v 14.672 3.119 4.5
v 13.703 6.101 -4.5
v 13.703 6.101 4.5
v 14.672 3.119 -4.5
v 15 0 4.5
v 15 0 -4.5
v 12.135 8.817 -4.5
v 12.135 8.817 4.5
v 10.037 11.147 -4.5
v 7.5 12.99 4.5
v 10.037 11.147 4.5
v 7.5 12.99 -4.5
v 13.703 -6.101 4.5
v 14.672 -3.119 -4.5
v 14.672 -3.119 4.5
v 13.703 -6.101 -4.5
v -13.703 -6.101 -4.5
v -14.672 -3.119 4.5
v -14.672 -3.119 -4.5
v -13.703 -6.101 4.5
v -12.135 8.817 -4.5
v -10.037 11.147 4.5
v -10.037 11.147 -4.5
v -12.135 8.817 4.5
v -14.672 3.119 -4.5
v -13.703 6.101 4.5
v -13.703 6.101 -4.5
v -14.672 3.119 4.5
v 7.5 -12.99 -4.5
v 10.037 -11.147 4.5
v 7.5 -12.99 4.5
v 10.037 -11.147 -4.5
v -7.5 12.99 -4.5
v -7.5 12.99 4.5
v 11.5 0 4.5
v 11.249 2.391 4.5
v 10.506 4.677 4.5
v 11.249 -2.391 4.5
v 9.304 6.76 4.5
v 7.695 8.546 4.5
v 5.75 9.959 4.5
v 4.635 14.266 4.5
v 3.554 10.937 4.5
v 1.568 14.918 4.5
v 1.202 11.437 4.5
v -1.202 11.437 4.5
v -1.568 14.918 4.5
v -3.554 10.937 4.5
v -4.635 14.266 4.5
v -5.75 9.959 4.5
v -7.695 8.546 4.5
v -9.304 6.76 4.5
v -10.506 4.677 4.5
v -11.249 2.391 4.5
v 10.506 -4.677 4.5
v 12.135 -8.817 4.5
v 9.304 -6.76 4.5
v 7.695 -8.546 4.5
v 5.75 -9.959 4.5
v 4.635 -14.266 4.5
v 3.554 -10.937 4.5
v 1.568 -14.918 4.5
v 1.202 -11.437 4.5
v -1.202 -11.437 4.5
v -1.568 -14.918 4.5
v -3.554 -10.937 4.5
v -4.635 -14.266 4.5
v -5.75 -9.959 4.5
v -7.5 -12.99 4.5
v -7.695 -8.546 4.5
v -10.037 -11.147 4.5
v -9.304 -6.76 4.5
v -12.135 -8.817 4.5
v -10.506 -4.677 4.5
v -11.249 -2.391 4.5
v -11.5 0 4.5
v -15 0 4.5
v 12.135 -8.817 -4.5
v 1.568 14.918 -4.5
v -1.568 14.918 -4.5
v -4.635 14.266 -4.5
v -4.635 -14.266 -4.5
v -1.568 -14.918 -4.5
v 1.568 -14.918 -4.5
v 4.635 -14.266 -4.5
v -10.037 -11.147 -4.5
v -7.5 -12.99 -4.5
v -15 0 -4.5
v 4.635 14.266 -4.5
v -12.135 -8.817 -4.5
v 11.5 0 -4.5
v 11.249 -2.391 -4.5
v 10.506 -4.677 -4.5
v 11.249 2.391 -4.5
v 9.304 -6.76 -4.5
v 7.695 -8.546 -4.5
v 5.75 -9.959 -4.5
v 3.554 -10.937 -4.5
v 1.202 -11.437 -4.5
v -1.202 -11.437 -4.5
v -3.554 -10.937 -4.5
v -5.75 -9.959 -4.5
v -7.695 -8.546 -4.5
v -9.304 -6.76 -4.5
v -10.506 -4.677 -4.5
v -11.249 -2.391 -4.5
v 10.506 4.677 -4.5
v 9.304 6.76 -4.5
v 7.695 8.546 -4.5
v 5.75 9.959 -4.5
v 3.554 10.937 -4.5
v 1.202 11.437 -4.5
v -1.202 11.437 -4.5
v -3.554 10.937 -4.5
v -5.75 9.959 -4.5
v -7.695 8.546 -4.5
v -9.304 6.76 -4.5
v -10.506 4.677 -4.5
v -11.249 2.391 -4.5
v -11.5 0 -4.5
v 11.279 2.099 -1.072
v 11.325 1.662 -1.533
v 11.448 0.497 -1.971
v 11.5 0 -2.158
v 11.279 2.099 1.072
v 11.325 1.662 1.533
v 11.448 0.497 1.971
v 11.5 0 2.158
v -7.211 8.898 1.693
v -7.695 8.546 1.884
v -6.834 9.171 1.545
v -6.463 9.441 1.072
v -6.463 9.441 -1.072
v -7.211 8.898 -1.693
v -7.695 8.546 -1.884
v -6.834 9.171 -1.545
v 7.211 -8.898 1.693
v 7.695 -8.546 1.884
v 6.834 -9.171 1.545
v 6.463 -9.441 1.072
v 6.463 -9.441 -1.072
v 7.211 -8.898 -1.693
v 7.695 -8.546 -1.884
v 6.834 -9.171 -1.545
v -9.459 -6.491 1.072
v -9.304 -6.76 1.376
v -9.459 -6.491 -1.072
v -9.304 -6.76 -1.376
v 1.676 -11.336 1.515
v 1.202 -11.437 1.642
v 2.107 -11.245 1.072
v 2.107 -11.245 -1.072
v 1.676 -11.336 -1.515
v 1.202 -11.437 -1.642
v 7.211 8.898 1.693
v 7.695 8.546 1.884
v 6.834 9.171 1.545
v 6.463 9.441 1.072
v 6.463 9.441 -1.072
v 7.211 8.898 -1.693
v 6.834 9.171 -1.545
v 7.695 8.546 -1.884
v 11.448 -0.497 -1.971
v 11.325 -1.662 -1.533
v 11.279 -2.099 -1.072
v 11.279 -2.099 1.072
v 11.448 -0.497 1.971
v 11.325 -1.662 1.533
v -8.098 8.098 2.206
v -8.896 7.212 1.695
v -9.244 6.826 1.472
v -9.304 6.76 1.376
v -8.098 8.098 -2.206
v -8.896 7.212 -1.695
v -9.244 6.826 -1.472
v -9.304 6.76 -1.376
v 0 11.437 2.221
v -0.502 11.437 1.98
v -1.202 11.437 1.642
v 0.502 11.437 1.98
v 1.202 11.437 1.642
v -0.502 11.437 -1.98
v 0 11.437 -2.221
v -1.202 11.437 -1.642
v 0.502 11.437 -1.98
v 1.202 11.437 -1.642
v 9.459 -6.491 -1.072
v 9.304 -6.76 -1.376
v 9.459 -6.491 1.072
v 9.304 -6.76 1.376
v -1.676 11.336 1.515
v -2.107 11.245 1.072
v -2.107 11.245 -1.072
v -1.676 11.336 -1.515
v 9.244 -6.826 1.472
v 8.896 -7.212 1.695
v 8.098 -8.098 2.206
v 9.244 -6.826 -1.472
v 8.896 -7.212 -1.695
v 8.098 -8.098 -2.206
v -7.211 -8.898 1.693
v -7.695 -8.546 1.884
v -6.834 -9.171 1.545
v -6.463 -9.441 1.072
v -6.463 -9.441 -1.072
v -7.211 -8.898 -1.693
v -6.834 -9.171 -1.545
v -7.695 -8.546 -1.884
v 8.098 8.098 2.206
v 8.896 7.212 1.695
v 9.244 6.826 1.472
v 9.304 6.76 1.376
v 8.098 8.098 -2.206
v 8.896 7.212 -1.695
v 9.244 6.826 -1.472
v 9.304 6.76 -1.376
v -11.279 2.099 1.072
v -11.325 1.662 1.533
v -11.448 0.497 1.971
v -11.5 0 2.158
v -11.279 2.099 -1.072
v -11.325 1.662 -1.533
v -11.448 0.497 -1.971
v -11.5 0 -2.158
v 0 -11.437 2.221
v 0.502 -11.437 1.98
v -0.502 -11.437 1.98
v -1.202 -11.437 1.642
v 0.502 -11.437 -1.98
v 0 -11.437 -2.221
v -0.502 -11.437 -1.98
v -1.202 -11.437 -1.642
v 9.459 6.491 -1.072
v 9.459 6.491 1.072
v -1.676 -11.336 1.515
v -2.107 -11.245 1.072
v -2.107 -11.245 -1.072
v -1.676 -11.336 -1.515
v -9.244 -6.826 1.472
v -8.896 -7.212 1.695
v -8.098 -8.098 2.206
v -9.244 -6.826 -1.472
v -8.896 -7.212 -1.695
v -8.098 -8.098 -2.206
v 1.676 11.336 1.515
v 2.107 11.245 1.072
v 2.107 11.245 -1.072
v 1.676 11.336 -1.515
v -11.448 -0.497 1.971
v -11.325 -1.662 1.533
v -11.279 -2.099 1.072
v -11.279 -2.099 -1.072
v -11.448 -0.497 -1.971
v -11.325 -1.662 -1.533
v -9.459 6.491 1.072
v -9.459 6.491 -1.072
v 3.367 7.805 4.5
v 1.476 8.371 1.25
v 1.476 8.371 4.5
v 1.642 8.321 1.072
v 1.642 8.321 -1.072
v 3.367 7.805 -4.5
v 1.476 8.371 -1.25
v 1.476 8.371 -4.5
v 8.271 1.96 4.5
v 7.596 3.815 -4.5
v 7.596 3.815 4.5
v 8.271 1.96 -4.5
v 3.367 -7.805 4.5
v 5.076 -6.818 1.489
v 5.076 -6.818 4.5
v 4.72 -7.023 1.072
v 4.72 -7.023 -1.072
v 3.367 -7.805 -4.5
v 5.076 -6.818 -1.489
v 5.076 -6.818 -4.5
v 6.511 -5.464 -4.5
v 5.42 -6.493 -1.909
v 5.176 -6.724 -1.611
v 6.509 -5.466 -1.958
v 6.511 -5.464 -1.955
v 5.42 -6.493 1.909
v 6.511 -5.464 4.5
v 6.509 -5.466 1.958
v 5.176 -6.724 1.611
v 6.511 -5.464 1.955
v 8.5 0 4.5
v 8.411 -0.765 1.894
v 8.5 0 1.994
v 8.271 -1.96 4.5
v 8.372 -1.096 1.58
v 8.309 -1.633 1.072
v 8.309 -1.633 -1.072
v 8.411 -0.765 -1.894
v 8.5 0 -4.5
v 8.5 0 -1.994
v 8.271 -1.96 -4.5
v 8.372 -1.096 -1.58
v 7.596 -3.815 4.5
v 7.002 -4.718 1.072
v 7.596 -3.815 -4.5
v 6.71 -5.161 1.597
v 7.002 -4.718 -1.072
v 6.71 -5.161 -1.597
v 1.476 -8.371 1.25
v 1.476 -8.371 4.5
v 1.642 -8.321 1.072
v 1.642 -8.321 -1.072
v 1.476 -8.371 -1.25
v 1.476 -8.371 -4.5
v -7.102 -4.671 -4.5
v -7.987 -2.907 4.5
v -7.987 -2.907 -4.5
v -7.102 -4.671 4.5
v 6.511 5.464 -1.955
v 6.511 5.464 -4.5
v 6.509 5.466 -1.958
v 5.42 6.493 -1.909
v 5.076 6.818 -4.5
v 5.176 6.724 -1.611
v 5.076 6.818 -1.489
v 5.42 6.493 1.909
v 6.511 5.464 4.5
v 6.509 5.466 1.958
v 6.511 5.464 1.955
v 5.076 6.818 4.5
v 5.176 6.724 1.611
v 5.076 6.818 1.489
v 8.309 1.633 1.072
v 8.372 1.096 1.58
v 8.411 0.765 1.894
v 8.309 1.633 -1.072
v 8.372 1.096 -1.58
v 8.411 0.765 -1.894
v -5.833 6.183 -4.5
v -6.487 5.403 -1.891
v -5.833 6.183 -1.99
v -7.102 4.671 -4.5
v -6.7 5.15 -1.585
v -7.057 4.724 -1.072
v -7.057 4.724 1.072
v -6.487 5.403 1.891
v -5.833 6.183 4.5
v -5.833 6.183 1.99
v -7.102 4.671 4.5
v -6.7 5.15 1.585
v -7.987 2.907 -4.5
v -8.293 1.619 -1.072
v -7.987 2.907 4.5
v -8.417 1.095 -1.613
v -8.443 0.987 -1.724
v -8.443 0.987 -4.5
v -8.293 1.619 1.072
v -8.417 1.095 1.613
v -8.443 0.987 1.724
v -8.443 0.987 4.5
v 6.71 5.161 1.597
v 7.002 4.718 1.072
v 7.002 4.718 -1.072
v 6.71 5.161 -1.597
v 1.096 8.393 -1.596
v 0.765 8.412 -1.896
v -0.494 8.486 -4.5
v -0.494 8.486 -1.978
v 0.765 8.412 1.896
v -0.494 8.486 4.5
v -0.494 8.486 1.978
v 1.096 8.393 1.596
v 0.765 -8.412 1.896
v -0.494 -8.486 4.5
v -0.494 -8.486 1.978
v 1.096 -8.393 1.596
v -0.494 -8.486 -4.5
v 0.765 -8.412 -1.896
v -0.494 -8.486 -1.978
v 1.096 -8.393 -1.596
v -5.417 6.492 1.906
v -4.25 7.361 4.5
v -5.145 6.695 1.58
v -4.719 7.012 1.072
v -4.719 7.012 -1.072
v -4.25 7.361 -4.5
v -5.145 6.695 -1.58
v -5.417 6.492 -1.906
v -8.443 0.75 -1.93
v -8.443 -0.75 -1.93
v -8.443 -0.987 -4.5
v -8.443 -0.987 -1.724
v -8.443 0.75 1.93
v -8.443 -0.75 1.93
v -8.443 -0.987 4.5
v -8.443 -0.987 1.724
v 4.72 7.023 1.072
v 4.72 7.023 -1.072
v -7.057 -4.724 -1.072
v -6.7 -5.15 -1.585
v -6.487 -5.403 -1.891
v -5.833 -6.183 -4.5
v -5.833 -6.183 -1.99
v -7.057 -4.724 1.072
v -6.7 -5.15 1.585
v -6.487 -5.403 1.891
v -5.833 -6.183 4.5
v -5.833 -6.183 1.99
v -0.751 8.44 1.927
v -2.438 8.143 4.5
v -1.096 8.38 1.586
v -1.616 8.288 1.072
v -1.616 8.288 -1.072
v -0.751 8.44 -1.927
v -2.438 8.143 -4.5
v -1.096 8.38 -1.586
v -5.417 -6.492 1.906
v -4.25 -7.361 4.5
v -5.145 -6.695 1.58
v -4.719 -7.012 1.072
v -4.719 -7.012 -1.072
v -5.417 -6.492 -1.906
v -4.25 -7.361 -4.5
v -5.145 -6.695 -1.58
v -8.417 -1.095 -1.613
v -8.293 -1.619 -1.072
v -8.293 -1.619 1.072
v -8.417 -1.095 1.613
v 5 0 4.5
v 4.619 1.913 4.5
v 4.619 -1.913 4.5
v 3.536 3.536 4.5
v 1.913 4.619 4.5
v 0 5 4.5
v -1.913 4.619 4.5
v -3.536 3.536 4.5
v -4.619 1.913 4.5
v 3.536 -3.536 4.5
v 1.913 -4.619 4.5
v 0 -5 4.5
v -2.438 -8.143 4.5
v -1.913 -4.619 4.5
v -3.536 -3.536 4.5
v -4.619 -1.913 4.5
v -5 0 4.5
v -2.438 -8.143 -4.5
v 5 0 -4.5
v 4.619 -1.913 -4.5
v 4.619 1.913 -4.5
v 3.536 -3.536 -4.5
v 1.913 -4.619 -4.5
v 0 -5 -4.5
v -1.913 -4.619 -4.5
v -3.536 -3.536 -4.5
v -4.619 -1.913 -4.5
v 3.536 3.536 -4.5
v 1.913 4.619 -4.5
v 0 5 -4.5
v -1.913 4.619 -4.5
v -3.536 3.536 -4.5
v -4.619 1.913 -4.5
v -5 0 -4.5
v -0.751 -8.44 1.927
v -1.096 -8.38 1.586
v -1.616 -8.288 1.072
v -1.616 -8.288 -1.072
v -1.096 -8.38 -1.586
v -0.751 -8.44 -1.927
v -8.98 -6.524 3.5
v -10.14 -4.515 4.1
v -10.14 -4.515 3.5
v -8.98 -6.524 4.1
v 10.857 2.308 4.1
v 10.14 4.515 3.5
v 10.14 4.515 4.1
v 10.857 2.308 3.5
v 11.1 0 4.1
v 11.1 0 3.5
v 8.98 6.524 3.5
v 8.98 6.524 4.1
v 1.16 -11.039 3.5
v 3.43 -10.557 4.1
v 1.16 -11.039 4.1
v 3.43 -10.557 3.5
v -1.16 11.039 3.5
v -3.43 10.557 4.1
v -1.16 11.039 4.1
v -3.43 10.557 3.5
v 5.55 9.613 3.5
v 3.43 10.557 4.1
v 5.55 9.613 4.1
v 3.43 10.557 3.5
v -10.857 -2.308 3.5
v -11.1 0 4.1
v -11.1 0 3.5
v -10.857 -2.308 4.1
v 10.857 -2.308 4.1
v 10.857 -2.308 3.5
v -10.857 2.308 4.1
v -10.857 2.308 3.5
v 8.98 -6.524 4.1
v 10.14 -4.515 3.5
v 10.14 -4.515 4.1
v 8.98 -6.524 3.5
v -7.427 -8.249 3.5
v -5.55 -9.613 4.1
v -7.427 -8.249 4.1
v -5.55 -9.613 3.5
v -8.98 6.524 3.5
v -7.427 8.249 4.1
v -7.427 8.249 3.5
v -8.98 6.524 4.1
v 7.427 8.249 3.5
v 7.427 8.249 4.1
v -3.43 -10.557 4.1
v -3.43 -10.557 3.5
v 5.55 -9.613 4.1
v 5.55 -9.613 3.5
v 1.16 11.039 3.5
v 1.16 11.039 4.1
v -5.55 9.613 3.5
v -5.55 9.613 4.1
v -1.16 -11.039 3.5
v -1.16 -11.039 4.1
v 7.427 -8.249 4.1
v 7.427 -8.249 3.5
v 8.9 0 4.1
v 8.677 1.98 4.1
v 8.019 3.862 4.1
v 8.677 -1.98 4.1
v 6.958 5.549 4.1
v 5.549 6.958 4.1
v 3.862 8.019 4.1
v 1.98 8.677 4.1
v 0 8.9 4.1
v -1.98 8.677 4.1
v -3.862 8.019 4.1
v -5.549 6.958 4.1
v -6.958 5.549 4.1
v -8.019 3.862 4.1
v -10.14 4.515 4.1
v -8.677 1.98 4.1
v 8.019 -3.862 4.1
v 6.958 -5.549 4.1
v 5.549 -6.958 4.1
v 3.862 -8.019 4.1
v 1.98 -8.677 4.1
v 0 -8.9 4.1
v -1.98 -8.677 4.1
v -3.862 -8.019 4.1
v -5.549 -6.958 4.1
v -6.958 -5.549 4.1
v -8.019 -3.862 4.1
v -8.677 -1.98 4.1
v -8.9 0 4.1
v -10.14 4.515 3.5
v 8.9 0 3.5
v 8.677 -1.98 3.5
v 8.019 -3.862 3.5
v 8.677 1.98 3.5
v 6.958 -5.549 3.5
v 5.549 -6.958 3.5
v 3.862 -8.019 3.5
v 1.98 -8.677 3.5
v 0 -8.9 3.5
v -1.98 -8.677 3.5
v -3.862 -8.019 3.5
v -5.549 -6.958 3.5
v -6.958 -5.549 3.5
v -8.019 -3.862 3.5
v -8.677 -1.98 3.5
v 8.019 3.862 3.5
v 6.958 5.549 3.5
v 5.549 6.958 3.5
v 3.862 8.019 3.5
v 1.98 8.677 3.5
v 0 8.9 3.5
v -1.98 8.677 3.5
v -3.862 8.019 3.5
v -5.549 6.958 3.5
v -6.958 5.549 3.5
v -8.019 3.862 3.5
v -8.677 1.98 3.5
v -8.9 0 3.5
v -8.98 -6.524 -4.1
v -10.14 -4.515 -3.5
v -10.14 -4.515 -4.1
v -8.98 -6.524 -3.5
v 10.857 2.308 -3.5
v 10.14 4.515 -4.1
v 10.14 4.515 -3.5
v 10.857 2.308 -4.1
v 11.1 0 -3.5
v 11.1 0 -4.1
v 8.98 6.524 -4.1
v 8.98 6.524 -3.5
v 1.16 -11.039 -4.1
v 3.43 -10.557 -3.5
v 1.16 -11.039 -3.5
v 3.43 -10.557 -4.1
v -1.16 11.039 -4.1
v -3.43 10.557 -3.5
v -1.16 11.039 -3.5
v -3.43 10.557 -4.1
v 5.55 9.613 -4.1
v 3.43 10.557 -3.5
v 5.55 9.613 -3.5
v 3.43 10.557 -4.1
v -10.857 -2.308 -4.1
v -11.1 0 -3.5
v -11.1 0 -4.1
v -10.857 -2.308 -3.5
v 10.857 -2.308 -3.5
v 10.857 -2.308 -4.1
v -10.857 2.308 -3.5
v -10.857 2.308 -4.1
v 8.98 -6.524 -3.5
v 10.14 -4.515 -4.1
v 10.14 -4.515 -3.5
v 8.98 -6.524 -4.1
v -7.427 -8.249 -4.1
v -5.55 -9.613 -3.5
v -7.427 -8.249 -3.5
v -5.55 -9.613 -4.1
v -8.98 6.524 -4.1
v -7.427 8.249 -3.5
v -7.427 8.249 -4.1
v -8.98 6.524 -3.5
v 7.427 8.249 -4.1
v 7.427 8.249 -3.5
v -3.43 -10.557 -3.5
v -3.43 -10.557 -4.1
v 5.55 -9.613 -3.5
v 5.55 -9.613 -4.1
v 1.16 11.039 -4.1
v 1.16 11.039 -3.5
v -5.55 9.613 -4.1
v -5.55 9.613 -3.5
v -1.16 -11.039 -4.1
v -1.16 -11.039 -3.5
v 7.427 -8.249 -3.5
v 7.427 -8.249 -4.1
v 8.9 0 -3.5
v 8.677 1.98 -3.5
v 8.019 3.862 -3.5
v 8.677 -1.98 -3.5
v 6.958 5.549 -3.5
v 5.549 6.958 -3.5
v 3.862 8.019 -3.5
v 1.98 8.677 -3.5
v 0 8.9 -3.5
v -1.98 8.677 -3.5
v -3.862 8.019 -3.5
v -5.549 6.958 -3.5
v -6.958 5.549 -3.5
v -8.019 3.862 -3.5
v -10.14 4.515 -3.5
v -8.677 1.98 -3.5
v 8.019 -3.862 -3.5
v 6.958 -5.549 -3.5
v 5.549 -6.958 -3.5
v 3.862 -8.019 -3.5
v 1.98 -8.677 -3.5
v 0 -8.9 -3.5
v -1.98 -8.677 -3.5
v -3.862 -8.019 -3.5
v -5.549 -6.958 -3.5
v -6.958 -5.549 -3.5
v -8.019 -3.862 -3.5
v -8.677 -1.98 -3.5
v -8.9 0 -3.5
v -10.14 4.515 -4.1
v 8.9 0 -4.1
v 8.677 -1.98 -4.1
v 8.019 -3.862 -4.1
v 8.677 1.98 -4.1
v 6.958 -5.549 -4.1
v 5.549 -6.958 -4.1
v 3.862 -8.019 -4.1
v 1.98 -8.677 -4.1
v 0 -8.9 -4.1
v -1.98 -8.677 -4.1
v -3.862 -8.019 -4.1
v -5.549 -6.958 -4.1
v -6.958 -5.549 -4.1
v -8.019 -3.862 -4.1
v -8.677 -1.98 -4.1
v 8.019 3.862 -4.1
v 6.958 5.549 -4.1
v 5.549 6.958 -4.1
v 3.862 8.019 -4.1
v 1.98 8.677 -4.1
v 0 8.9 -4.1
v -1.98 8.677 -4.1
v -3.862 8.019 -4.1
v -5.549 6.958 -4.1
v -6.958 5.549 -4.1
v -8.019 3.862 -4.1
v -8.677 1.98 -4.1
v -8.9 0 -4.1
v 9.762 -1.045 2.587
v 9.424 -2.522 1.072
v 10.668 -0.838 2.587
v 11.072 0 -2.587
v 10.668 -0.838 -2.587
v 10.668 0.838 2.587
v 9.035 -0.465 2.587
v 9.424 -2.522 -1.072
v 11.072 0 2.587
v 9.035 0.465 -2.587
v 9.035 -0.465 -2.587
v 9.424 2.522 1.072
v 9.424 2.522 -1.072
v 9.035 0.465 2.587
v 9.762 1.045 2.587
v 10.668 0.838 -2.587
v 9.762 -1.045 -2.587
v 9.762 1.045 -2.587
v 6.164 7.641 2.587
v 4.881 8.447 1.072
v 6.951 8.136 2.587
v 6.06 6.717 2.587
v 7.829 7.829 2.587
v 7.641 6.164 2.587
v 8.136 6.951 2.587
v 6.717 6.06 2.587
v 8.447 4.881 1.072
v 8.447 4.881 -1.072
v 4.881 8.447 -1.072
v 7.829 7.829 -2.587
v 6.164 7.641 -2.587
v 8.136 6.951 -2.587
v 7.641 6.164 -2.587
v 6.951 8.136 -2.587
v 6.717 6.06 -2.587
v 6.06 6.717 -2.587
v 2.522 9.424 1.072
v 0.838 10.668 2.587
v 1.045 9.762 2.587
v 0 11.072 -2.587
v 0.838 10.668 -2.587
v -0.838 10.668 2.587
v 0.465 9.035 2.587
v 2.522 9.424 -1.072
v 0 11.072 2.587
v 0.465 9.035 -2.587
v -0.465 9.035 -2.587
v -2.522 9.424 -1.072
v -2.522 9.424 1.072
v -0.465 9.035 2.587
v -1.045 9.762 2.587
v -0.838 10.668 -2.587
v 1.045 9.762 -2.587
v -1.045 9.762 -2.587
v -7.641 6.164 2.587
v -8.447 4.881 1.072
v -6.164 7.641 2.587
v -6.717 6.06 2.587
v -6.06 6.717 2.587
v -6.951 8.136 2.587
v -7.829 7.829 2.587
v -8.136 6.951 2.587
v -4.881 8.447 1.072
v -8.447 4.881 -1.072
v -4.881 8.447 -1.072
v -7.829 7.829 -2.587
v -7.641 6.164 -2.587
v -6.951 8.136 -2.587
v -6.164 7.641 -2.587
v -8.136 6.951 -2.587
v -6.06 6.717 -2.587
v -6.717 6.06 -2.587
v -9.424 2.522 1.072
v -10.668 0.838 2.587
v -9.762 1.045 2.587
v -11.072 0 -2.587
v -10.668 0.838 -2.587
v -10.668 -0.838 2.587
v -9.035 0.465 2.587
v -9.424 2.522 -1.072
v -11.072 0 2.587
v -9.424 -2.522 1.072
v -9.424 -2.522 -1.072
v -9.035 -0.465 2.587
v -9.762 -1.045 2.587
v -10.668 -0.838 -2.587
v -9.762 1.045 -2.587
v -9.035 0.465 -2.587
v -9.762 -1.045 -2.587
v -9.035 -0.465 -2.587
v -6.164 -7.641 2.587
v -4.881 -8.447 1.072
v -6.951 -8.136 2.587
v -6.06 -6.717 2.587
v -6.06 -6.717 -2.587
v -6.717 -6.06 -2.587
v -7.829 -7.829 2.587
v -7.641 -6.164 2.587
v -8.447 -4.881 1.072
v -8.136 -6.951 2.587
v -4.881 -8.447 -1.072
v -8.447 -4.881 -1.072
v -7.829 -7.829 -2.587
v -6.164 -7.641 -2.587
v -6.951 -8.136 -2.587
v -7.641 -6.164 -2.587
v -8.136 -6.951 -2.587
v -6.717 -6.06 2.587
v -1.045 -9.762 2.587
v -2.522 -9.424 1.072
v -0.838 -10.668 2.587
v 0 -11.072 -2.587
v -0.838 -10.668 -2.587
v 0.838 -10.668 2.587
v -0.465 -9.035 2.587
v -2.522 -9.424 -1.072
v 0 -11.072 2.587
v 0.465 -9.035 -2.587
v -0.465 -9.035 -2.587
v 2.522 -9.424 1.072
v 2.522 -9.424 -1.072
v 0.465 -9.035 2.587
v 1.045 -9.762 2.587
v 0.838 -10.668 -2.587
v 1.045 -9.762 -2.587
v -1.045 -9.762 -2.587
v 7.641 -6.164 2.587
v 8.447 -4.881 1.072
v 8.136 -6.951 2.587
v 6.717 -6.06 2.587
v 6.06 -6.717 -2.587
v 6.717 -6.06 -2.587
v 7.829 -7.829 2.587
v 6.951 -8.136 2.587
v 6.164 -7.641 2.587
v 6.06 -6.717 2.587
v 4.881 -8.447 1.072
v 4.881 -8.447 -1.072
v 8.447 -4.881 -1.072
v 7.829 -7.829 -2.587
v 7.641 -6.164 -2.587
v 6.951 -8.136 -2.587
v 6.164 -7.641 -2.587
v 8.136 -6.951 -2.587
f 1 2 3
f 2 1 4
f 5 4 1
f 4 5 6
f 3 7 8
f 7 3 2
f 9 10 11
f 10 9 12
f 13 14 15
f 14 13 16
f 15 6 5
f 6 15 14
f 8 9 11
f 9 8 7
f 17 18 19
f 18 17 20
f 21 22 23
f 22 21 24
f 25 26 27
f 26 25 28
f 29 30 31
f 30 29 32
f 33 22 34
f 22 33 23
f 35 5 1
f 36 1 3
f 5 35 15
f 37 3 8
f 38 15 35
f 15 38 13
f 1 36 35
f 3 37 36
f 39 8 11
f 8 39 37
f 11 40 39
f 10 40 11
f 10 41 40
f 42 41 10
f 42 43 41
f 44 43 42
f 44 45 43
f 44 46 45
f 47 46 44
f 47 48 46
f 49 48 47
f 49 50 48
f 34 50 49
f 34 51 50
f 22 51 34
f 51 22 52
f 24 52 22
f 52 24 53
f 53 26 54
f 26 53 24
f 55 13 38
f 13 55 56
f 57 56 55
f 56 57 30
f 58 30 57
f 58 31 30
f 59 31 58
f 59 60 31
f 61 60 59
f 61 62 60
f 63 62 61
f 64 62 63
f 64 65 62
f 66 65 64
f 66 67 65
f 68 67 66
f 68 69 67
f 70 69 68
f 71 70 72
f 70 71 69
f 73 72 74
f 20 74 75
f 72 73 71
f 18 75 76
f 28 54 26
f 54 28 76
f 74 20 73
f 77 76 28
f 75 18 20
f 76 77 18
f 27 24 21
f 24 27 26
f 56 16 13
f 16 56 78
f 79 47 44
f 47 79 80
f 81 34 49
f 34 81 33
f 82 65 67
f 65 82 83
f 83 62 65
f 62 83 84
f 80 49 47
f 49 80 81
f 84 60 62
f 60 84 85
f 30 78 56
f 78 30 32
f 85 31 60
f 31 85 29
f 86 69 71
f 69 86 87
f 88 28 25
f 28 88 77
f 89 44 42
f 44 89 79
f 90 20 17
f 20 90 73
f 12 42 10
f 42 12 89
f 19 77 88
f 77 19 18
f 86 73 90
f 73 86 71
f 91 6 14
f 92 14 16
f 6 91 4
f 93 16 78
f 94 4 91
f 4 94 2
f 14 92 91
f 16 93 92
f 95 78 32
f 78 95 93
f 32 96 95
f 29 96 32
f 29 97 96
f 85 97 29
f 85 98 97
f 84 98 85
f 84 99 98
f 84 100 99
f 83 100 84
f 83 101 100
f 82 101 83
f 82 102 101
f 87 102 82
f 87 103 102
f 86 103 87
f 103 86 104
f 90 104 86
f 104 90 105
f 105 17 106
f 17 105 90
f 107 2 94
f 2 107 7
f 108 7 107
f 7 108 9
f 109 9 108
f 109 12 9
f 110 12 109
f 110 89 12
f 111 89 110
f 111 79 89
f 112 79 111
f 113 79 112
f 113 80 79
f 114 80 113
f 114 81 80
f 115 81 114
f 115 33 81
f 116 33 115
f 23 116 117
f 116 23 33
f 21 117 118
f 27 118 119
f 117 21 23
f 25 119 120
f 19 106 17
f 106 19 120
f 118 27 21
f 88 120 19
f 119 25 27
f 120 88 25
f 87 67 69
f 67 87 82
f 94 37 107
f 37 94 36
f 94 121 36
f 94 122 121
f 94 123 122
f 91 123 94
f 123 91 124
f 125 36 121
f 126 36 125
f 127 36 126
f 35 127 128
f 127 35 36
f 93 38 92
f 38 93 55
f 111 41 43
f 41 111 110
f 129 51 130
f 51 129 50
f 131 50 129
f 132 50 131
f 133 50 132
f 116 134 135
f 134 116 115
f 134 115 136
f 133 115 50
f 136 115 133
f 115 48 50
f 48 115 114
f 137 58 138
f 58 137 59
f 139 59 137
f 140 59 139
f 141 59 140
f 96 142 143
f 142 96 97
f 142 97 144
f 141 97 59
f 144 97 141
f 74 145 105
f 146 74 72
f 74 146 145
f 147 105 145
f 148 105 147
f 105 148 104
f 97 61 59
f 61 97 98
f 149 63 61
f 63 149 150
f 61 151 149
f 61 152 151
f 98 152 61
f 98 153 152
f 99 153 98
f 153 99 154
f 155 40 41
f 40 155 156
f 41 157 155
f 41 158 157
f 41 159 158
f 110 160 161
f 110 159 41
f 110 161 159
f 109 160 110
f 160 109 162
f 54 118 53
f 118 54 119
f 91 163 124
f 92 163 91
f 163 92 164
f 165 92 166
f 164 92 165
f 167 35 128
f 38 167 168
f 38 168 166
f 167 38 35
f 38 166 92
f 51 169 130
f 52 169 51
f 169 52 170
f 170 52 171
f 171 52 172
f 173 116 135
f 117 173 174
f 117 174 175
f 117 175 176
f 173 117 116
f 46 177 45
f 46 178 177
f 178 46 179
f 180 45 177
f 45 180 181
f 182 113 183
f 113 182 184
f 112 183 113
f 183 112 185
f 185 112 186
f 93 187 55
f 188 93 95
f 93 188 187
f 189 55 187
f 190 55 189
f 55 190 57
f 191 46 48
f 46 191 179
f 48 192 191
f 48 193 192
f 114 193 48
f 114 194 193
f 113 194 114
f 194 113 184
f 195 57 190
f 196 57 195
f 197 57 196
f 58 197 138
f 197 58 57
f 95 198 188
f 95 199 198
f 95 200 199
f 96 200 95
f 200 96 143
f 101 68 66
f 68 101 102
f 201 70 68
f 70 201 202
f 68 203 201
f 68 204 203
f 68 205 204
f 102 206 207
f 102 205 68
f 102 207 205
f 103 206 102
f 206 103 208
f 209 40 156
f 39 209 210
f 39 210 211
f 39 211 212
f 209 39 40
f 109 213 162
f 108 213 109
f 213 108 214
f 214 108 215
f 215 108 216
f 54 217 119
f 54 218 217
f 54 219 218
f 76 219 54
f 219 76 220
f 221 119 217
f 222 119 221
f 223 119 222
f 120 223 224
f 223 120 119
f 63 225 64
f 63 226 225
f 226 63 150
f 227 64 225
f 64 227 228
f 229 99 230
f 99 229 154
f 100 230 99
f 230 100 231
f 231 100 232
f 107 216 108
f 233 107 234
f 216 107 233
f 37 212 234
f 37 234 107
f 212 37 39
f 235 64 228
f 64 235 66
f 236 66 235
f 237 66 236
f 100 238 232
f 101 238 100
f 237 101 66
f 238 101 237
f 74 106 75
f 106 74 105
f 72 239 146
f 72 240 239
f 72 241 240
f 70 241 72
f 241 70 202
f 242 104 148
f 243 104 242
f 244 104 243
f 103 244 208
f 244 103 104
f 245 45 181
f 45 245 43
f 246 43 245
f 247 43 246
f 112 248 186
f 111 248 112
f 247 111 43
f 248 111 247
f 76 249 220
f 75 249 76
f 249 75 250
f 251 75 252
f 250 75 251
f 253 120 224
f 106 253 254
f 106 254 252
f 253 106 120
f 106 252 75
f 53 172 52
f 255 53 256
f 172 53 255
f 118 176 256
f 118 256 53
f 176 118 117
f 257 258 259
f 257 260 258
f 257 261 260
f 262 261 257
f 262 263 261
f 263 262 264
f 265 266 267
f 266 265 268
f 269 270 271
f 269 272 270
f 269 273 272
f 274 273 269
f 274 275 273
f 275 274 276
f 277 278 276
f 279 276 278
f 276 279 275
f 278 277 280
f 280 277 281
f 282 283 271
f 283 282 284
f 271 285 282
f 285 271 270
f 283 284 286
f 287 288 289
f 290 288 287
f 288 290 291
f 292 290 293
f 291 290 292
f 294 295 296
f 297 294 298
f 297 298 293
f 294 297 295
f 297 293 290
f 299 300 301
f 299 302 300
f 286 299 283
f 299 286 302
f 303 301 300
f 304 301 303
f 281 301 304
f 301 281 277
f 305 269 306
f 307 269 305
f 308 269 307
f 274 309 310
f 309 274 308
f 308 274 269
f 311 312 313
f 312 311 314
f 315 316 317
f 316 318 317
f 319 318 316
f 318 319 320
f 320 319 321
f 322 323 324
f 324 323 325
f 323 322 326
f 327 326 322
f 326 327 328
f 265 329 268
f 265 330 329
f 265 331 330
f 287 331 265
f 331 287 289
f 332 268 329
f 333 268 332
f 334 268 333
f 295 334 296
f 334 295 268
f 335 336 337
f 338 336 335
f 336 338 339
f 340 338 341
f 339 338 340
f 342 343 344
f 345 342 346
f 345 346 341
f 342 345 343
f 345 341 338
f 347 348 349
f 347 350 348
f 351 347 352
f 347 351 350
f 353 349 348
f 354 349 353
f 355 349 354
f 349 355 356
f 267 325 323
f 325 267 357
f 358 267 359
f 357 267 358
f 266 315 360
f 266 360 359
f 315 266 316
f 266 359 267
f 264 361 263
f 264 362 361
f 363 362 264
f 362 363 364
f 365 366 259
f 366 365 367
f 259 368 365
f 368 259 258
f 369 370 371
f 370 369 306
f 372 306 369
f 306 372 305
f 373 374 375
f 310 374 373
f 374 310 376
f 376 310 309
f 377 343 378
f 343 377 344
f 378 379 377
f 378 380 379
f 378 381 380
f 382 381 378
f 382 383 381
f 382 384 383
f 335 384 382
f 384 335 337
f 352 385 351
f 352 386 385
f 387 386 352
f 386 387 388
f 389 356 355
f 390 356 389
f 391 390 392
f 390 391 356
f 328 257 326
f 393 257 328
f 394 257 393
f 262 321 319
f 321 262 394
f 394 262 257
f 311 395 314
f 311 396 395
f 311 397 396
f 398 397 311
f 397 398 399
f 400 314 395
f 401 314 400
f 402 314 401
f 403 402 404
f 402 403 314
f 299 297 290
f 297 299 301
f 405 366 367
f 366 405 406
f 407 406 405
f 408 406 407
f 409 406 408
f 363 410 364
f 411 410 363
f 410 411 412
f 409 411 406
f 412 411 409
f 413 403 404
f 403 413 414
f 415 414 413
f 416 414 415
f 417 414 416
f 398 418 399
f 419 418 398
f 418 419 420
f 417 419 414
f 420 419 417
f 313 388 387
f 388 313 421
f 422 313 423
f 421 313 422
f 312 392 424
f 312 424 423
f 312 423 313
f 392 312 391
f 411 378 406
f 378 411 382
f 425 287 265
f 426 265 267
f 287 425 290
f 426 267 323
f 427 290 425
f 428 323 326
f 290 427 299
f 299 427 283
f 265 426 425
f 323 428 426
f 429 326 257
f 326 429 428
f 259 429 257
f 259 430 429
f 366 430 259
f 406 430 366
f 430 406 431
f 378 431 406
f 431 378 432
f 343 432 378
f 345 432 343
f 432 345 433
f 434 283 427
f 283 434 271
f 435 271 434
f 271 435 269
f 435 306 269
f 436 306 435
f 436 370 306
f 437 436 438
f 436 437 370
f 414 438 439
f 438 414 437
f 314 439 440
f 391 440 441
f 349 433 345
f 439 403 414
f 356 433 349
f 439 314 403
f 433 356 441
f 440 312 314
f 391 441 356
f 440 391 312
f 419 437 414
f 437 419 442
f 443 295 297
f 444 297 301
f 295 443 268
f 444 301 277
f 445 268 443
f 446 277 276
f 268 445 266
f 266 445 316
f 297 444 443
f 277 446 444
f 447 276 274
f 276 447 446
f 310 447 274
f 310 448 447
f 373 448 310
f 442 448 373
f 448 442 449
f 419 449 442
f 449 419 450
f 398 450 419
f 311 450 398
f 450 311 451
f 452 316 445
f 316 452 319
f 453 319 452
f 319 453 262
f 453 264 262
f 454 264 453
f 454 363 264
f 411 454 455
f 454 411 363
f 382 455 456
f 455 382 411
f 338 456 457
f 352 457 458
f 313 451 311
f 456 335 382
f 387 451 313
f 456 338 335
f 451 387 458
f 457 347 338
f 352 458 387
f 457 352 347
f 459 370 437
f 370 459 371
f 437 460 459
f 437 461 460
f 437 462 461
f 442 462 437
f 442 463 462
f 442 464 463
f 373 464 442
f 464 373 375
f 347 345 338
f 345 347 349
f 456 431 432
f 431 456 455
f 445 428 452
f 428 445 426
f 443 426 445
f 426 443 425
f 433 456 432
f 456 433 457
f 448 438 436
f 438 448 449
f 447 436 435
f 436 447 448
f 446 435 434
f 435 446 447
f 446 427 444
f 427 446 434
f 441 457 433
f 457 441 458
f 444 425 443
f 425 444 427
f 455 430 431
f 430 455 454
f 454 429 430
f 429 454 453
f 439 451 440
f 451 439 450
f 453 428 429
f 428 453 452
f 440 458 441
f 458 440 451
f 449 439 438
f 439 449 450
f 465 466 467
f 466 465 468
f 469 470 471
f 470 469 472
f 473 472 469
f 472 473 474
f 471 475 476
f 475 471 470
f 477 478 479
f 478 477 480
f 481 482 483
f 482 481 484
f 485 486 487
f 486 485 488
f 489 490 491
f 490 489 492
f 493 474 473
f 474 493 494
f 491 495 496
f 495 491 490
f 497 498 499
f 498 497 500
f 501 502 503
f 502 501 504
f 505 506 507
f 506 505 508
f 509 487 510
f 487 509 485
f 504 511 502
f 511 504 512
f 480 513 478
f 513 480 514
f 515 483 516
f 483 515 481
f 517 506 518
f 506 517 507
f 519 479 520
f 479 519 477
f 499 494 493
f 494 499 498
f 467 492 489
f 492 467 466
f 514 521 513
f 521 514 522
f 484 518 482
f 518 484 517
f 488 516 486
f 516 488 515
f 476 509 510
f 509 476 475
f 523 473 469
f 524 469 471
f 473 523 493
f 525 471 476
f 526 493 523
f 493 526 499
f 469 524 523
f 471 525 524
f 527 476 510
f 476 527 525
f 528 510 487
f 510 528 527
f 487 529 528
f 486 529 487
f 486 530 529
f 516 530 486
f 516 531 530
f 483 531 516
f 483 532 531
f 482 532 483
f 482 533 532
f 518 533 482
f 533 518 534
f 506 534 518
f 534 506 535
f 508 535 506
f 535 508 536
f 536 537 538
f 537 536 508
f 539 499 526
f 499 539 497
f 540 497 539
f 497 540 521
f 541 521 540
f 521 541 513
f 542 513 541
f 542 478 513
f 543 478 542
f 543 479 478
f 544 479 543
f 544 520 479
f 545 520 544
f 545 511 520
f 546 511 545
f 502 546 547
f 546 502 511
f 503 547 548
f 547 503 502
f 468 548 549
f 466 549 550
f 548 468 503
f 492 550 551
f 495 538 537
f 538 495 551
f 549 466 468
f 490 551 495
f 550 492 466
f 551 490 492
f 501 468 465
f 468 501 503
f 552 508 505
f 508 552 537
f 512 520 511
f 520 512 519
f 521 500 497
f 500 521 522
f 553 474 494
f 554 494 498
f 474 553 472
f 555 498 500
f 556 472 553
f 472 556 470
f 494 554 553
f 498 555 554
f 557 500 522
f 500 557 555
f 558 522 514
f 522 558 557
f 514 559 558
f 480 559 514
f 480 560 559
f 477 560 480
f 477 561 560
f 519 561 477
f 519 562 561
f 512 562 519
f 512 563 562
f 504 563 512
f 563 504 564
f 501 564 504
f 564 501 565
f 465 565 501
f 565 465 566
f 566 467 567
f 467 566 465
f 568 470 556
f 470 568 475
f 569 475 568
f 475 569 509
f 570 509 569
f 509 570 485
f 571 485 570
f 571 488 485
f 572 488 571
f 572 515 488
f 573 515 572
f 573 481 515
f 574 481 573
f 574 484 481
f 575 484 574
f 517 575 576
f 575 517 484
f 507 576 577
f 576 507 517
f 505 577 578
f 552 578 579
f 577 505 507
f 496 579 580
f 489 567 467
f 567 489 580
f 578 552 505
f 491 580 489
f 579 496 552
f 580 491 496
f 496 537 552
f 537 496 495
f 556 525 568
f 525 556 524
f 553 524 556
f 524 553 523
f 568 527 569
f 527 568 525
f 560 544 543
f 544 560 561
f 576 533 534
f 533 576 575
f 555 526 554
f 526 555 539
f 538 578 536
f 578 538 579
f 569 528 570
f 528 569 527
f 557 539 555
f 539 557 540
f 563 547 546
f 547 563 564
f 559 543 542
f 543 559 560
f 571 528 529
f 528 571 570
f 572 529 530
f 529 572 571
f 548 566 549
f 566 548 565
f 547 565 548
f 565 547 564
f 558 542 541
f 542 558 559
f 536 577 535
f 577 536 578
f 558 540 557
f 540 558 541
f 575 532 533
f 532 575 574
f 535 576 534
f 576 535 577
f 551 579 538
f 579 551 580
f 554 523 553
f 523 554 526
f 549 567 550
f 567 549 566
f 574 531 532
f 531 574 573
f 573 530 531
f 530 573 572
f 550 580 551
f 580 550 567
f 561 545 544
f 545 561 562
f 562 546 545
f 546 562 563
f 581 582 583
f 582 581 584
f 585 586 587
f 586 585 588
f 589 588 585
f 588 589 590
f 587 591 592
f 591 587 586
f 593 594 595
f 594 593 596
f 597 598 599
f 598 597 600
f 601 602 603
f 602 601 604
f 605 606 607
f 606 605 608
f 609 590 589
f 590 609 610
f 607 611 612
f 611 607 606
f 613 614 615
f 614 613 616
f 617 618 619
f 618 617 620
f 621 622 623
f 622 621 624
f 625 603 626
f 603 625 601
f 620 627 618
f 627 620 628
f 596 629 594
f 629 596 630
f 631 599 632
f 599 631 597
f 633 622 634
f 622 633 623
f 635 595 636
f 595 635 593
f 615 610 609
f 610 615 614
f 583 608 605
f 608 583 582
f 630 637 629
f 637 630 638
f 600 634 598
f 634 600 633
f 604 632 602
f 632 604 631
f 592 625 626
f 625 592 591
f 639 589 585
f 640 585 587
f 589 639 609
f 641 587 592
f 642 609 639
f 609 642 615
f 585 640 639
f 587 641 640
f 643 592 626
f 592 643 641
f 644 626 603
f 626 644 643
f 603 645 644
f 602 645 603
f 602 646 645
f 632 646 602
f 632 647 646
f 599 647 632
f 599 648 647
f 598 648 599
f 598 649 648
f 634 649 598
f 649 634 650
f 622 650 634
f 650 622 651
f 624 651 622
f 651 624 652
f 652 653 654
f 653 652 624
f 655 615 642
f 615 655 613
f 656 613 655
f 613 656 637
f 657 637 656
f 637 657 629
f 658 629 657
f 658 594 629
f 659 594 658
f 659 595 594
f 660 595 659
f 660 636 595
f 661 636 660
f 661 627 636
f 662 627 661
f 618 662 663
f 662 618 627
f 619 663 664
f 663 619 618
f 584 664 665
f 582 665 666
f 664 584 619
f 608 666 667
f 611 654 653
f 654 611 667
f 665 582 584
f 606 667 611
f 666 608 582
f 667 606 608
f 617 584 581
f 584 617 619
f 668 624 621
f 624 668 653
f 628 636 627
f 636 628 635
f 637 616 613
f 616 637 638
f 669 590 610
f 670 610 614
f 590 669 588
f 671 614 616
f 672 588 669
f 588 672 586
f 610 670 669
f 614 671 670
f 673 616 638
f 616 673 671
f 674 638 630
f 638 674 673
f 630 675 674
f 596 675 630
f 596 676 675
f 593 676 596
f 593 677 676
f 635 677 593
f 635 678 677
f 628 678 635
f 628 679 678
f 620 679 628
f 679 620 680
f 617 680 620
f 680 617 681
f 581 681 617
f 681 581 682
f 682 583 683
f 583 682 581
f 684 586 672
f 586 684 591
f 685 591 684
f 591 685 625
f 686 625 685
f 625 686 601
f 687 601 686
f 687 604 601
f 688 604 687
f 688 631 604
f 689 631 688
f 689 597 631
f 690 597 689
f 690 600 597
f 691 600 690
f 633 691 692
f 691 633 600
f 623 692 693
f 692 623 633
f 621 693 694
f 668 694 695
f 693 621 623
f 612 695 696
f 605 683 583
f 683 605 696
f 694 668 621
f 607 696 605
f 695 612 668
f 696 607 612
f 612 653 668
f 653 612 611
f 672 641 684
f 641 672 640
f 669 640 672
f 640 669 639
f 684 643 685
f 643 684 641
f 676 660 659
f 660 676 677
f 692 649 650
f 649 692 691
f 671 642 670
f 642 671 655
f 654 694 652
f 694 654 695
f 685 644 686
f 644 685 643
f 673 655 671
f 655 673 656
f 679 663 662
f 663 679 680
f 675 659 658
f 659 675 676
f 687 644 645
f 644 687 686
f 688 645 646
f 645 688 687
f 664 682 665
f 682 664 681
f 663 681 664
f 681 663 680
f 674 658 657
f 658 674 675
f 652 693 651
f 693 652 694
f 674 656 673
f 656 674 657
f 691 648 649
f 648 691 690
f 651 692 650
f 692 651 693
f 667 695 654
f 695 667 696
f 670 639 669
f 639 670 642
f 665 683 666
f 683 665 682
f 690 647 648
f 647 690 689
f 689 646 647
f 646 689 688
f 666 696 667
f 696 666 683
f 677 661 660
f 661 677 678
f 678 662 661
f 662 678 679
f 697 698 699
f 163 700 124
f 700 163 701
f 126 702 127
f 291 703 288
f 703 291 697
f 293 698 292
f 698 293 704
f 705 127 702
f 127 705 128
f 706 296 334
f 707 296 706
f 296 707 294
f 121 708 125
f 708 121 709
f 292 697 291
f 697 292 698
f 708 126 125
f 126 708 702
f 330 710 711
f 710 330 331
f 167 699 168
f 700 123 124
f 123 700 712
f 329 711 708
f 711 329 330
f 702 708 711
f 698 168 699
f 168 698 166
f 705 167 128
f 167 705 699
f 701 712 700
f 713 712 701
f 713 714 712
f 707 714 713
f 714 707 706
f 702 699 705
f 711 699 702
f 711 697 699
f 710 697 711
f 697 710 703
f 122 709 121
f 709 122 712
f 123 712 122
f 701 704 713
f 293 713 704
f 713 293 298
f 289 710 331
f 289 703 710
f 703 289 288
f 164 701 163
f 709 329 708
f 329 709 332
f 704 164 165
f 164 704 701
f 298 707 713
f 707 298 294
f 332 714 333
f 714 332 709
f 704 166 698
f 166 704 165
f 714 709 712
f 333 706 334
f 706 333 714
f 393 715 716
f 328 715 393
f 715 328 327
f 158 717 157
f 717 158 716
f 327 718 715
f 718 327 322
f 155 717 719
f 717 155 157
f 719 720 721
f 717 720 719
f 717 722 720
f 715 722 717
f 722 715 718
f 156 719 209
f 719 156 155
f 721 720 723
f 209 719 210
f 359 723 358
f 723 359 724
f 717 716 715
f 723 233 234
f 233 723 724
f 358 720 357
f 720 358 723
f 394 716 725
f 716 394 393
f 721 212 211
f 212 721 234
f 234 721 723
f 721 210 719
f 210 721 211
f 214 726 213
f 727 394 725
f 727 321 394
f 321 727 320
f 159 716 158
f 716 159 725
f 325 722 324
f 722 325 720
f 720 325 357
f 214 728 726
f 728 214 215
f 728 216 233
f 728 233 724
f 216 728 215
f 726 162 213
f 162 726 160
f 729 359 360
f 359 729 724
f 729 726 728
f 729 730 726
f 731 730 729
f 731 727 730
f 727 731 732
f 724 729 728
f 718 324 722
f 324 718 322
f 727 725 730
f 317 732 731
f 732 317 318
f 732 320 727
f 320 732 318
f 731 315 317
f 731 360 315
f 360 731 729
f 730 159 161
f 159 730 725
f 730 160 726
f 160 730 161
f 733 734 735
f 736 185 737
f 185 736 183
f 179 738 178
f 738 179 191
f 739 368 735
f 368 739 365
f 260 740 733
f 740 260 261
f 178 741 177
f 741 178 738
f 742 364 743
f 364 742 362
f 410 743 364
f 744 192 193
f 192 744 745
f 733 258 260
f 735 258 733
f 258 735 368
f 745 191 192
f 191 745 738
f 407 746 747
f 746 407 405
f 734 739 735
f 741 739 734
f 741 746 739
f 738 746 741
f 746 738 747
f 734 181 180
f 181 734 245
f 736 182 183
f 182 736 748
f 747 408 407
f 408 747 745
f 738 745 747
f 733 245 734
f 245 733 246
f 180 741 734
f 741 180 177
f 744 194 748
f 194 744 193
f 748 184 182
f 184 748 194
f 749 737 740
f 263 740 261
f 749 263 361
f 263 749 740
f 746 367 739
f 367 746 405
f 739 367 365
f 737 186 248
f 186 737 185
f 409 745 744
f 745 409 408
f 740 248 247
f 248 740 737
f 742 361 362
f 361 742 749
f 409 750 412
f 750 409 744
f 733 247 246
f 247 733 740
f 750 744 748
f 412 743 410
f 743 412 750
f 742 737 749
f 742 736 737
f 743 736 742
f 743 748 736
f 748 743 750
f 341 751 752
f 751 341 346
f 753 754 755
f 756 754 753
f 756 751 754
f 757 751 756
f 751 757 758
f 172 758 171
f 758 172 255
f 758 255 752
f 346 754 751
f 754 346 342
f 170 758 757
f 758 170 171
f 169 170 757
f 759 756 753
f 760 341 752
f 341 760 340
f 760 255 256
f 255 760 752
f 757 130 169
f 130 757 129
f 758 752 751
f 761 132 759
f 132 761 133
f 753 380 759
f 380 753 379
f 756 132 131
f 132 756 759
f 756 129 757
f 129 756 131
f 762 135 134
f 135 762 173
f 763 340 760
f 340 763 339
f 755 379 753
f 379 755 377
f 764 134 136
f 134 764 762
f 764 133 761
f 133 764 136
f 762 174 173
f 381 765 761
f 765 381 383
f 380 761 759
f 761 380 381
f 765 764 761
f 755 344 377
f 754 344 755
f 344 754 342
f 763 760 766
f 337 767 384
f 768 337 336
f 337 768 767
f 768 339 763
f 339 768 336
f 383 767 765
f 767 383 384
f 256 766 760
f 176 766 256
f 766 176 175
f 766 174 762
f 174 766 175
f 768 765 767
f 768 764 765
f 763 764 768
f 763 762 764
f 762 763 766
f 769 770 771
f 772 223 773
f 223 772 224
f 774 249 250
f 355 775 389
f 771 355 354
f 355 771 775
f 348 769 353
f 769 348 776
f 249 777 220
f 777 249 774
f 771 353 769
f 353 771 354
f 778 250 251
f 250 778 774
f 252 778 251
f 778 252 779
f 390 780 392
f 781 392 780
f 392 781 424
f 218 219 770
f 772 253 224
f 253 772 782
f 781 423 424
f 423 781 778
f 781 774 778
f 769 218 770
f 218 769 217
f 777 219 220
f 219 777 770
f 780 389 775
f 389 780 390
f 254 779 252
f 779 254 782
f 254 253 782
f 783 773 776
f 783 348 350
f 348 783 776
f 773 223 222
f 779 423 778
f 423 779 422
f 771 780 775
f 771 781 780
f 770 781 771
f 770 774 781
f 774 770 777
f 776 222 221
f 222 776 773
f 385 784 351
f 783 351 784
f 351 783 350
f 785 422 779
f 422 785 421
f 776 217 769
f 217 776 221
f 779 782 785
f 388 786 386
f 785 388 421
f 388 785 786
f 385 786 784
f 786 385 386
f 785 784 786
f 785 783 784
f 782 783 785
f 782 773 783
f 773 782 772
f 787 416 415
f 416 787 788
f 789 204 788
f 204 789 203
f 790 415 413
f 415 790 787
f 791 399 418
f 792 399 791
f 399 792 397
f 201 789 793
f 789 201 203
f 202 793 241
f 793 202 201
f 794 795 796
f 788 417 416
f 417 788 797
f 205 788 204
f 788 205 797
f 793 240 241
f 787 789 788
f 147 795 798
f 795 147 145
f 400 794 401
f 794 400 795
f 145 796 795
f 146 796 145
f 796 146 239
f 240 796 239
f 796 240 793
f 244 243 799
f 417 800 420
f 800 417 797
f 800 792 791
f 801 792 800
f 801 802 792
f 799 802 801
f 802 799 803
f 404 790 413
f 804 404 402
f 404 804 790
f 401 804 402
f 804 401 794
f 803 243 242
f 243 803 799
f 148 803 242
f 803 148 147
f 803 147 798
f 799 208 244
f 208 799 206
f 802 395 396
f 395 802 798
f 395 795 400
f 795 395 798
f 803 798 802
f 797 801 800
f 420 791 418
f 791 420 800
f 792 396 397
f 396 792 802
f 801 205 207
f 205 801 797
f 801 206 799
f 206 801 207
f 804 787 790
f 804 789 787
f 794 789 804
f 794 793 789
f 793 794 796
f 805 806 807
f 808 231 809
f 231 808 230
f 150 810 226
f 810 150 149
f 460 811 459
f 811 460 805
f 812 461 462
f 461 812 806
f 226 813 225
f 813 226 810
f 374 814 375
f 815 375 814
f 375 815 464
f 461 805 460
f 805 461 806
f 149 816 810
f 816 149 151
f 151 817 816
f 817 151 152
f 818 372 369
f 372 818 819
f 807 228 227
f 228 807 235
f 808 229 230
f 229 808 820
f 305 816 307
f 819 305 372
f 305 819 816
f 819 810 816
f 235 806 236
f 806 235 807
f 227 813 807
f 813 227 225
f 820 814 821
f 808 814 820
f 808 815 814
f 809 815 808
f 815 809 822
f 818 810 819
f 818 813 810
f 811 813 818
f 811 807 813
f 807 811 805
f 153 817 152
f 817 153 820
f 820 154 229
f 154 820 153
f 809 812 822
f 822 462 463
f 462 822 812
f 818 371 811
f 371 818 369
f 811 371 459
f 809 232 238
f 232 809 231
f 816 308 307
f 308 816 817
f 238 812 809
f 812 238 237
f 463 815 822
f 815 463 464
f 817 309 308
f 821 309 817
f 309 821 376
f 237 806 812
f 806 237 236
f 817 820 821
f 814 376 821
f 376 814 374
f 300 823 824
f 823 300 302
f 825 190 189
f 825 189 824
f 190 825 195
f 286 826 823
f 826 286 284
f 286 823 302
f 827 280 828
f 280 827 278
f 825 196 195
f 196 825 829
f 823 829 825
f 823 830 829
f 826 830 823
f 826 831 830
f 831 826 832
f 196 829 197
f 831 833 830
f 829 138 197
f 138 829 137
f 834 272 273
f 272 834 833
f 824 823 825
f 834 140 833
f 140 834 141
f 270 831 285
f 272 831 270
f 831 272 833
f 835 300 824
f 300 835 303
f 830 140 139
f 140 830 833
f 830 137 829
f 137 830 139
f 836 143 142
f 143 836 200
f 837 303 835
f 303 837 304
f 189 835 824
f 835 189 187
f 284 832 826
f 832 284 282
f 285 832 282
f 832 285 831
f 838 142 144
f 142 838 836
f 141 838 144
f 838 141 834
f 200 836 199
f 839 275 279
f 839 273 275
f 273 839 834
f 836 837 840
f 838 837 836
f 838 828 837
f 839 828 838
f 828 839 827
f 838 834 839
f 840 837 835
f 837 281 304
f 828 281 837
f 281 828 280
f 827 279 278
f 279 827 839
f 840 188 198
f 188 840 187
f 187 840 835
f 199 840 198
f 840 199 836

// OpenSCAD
// Parameters
bore_diameter_mm = 10; //[5:20:0.5]
outer_diameter_mm = 30; //[15:60:0.5]
width_mm = 9; //[4.5:18:0.5]
radial_thickness_mm = 3.5; //[2:7:0.1]
shield_thickness_mm = 0.6; //[0.3:1.2:0.05]
shield_radial_gap_mm = 0.4; //[0.1:1.0:0.05]
shield_axial_inset_mm = 0.4; //[0.1:1.5:0.05]
ball_diameter_mm = 4.0; //[2.5:6.0:0.1]
ball_count = 8; //[6:12:1]
ball_overlap_mm = 0.8; //[0.3:1.5:0.05]
eps_mm = 0.2; //[0.05:0.5:0.05]

// Bearing Ball - complete geometry
module bearing_ball() {
  color("Silver") {
    sphere(r=ball_diameter_mm/2);
  }
}

// BB6200 - complete geometry
module ball_bearing() {
  color("DimGray") {
    // Outer Ring
    difference() {
      cylinder(r=outer_diameter_mm/2, h=width_mm, center=true);
      cylinder(r=outer_diameter_mm/2 - radial_thickness_mm, h=width_mm + 2*eps_mm, center=true);
    }
    // Inner Ring
    difference() {
      cylinder(r=bore_diameter_mm/2 + radial_thickness_mm, h=width_mm, center=true);
      cylinder(r=bore_diameter_mm/2, h=width_mm + 2*eps_mm, center=true);
    }
  }
  
  // Shields
  color("Black") {
    translate([0, 0, width_mm/2 - shield_axial_inset_mm - shield_thickness_mm/2])
      difference() {
        cylinder(r=outer_diameter_mm/2 - radial_thickness_mm - shield_radial_gap_mm, h=shield_thickness_mm, center=true);
        cylinder(r=bore_diameter_mm/2 + radial_thickness_mm + shield_radial_gap_mm, h=shield_thickness_mm + 2*eps_mm, center=true);
      }
    translate([0, 0, -(width_mm/2 - shield_axial_inset_mm - shield_thickness_mm/2)])
      difference() {
        cylinder(r=outer_diameter_mm/2 - radial_thickness_mm - shield_radial_gap_mm, h=shield_thickness_mm, center=true);
        cylinder(r=bore_diameter_mm/2 + radial_thickness_mm + shield_radial_gap_mm, h=shield_thickness_mm + 2*eps_mm, center=true);
      }
  }
  
  // Balls
  color("Silver") {
    for (i = [0:ball_count-1]) {
      rotate([0, 0, i*360/ball_count]) 
        translate([((bore_diameter_mm/2 + radial_thickness_mm) + (outer_diameter_mm/2 - radial_thickness_mm))/2, 0, 0])
          scale((ball_diameter_mm + 2*ball_overlap_mm)/ball_diameter_mm)
            bearing_ball();
    }
  }
}

// Assembly
module assembly() {
  ball_bearing();
}

assembly();
